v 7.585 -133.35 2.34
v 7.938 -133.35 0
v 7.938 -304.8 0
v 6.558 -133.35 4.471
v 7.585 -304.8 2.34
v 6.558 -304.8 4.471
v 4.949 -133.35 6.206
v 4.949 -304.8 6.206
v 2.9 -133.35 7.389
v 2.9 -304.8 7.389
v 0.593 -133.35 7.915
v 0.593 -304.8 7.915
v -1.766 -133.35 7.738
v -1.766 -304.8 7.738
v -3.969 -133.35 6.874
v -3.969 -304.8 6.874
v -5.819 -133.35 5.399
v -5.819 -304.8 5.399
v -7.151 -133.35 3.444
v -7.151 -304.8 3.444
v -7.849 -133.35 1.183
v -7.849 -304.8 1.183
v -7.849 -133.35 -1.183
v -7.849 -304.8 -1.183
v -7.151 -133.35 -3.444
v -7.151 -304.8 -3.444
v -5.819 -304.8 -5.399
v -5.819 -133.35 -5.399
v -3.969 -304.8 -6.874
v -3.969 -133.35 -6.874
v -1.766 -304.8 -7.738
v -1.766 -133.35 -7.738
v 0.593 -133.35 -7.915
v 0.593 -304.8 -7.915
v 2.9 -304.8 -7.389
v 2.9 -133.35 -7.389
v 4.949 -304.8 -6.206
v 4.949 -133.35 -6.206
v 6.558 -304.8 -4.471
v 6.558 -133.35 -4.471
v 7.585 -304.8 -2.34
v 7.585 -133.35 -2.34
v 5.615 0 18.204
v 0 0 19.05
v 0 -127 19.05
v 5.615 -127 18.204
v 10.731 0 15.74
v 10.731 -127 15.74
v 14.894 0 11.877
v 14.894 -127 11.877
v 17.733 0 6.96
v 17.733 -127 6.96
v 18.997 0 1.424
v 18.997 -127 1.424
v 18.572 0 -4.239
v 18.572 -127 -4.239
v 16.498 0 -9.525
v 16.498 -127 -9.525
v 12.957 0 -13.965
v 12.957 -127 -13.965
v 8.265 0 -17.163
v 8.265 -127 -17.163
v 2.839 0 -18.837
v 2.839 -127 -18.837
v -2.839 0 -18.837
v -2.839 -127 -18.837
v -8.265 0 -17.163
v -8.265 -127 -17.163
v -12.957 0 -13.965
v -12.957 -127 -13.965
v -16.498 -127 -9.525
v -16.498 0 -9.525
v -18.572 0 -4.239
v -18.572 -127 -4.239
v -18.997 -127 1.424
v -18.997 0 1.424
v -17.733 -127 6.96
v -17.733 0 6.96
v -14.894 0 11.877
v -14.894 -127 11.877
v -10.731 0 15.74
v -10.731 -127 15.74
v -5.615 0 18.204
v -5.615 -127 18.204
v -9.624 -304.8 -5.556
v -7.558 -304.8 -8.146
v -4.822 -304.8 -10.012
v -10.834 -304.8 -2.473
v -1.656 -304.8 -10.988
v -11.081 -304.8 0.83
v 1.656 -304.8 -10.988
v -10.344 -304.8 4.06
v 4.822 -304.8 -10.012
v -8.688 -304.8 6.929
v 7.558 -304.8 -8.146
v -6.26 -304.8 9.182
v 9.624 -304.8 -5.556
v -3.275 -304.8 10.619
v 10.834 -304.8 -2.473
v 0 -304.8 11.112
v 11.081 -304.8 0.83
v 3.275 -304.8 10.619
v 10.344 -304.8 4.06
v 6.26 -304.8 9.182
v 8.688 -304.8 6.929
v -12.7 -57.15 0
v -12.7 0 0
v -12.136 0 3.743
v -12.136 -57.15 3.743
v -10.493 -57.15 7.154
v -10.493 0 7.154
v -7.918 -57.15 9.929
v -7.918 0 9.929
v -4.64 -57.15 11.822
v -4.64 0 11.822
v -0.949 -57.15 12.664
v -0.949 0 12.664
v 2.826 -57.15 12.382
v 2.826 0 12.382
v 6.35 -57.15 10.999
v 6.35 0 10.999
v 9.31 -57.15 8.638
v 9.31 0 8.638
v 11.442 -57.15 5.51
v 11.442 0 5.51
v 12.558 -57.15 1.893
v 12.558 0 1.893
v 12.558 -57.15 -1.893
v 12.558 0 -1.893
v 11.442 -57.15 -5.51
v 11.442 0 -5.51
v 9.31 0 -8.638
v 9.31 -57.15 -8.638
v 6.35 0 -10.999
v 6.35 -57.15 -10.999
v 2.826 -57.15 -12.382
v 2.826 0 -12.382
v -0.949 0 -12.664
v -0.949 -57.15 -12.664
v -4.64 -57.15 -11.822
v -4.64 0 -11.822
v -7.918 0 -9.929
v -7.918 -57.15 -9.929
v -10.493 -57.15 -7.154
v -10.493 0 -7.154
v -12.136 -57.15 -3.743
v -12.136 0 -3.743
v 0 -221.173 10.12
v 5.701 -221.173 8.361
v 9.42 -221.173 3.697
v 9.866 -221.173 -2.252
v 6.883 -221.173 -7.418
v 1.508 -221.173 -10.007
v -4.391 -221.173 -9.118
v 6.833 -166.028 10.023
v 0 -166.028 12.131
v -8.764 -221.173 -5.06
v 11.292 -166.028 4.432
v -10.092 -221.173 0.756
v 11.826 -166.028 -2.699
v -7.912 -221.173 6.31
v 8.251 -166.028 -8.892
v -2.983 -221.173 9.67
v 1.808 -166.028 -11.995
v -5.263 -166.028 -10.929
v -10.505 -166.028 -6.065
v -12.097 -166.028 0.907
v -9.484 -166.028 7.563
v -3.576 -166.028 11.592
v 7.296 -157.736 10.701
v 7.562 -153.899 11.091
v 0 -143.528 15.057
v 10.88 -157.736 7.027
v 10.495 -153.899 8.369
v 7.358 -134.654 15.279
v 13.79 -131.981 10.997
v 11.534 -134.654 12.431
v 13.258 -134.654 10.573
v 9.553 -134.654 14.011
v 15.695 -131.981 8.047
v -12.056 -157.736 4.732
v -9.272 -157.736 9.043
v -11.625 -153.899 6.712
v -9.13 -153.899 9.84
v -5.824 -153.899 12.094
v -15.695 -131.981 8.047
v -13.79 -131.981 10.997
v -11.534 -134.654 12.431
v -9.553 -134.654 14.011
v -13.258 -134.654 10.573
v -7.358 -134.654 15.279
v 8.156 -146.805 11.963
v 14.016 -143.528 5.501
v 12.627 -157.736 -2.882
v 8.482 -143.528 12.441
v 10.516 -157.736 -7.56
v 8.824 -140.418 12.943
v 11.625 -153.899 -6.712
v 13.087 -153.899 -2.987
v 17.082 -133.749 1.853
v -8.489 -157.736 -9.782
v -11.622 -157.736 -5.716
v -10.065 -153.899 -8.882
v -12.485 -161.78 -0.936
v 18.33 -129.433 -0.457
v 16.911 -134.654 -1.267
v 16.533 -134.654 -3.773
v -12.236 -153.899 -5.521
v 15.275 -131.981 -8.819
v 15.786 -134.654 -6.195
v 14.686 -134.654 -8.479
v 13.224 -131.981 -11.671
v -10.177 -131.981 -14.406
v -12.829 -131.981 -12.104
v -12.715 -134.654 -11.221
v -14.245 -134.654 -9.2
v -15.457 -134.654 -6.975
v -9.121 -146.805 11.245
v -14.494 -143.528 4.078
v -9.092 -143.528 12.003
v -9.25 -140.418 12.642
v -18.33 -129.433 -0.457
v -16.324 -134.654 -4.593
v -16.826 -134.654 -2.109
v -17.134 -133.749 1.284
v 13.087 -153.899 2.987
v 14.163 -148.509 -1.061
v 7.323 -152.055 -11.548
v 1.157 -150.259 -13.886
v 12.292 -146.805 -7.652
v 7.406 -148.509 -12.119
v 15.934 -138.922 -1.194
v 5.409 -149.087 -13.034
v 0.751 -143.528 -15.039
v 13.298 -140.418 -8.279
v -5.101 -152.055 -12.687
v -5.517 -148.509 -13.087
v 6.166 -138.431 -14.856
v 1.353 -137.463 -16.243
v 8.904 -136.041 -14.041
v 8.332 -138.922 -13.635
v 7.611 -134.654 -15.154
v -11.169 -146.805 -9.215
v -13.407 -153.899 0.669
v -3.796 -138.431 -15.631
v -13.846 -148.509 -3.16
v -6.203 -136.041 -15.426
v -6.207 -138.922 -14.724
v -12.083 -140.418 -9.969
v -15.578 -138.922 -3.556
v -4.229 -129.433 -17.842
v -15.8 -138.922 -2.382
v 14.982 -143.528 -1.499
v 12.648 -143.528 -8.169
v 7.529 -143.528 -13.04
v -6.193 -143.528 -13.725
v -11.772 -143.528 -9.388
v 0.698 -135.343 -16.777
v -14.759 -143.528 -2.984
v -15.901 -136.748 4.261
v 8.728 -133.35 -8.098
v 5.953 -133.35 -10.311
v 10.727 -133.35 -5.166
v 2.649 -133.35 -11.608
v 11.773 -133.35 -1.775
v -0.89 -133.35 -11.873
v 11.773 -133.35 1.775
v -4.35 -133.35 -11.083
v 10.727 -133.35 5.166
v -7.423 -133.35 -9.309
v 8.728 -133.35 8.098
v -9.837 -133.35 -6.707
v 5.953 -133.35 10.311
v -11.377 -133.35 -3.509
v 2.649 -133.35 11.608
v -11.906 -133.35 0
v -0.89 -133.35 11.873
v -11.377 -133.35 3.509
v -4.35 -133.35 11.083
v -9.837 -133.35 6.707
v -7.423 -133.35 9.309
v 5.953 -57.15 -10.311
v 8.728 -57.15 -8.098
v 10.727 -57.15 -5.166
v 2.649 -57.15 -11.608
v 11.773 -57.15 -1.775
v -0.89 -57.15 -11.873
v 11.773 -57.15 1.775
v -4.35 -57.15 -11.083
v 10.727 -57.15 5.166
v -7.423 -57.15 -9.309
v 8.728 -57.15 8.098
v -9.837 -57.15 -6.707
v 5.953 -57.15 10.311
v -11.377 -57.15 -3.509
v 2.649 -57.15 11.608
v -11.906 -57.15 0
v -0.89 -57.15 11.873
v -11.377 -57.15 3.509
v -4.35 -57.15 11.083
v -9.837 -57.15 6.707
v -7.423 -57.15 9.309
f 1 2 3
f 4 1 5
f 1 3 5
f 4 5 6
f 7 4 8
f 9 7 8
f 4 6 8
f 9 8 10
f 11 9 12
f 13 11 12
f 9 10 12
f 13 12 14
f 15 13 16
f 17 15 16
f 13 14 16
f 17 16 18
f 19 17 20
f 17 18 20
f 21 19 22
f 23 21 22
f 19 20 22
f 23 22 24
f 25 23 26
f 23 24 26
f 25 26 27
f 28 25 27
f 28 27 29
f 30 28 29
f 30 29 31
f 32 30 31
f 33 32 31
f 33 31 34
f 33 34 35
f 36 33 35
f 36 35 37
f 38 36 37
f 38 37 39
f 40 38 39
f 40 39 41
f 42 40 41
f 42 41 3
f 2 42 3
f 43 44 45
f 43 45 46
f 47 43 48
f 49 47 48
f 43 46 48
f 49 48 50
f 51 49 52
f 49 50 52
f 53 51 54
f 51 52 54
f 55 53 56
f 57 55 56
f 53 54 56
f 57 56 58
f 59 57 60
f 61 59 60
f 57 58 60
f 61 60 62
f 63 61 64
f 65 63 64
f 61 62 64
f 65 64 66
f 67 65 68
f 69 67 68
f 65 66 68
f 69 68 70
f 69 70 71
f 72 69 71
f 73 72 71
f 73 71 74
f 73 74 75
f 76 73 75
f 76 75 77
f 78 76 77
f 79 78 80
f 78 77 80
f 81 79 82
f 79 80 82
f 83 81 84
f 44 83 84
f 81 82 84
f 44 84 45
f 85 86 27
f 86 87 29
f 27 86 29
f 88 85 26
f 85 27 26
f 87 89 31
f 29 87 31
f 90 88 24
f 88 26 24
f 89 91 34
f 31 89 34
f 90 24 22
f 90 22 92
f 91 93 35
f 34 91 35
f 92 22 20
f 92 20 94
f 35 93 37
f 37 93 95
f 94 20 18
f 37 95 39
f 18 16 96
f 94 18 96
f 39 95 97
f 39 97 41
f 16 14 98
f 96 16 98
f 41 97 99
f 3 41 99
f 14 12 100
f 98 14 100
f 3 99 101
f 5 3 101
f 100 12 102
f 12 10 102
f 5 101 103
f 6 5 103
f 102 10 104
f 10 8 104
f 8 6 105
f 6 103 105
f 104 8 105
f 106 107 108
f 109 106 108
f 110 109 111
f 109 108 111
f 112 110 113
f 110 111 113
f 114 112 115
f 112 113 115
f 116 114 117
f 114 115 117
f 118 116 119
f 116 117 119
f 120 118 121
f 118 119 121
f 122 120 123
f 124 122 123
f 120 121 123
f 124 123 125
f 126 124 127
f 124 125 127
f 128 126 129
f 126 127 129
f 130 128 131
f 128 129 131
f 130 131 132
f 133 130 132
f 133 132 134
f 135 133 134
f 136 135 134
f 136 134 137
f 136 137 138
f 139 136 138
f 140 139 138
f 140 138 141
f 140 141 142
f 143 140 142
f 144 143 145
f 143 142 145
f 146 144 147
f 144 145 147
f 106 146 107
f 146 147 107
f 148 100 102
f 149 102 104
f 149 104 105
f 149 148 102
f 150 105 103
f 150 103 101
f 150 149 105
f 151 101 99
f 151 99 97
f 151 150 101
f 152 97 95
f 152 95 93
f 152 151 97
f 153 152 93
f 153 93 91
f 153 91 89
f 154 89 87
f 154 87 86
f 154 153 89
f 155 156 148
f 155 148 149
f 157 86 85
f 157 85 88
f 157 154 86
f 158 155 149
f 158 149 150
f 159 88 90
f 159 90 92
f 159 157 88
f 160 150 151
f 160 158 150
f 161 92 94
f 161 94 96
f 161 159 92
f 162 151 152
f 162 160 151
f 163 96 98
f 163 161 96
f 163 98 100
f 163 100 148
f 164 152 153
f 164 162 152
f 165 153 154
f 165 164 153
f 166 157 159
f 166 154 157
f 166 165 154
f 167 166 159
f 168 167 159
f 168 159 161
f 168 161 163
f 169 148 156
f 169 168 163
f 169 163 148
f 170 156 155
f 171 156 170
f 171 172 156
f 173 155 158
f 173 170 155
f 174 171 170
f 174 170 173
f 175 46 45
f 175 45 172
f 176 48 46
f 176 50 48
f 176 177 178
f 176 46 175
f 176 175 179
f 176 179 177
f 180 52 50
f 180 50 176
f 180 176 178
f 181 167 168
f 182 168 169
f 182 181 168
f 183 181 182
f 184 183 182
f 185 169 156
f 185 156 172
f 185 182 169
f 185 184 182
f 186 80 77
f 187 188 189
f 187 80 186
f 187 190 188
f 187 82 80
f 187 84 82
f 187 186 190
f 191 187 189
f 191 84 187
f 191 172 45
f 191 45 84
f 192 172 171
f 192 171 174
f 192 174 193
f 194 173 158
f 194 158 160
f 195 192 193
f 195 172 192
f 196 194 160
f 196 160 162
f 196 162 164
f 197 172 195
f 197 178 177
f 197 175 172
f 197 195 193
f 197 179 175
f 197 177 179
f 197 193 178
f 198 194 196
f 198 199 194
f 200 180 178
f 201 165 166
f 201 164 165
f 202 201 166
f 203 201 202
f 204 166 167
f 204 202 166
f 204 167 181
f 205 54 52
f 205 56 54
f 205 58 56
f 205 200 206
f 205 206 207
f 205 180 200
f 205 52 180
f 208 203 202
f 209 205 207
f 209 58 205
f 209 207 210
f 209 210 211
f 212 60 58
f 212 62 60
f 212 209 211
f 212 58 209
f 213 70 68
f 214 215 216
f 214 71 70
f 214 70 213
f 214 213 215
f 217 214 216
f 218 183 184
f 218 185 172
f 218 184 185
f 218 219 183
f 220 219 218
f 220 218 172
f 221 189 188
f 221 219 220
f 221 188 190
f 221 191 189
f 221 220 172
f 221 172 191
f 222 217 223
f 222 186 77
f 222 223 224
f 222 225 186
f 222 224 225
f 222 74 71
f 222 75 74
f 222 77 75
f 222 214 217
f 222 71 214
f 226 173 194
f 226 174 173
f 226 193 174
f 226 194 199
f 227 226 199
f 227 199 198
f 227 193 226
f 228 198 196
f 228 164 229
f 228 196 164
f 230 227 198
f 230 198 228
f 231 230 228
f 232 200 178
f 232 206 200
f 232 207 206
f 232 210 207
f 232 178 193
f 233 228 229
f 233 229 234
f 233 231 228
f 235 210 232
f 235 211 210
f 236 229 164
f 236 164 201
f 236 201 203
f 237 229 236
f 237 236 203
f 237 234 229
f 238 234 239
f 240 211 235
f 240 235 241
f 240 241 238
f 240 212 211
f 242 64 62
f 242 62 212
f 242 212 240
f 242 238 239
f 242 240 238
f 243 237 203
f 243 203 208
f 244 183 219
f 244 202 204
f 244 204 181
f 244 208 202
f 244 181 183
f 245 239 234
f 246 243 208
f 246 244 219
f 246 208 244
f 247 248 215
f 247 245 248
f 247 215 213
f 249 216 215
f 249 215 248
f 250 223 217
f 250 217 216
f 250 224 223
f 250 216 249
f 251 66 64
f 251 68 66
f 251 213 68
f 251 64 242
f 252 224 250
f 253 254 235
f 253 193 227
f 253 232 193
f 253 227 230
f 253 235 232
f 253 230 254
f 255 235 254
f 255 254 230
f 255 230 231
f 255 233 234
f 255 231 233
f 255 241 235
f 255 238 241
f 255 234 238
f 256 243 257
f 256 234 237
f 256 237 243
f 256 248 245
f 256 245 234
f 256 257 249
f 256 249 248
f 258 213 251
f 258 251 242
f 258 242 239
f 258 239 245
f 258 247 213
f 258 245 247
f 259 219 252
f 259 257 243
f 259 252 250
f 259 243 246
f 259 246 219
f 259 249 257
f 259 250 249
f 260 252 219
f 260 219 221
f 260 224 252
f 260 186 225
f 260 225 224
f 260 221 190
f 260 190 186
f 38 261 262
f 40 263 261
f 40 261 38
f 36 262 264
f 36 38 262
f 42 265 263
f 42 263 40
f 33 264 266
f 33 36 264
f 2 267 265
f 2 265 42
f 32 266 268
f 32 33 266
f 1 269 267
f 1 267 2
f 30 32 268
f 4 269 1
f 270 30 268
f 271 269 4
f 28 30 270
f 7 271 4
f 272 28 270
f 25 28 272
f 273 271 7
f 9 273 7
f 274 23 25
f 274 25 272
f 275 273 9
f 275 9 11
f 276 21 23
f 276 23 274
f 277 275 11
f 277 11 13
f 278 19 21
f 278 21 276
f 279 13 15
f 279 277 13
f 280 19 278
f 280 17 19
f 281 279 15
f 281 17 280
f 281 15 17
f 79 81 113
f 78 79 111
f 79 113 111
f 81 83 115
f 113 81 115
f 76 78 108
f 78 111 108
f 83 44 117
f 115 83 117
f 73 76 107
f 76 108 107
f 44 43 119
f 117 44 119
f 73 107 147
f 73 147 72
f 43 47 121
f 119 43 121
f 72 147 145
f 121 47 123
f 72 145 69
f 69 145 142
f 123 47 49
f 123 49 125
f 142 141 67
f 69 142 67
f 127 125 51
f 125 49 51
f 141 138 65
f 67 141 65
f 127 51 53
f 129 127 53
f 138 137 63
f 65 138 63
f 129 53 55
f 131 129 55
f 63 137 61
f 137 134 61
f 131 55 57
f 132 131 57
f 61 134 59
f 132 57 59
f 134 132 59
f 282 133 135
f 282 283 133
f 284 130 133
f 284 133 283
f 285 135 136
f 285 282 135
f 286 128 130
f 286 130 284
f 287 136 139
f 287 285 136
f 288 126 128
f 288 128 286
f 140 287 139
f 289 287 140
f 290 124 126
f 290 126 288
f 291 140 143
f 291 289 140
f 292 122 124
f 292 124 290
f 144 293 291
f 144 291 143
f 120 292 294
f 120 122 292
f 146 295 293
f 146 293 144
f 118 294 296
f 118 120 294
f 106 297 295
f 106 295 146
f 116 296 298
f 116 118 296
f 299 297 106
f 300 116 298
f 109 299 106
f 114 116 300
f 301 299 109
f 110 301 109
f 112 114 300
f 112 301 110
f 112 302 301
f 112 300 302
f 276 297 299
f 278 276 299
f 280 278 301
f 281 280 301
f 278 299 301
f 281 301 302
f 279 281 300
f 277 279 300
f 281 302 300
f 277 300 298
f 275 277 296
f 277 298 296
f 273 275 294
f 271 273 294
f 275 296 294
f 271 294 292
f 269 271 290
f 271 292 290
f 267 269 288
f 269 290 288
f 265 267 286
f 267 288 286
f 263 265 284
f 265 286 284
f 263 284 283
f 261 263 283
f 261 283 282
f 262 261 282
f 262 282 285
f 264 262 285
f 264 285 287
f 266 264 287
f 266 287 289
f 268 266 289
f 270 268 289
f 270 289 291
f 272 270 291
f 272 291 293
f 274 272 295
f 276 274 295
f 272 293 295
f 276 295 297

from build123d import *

# Parameters (mm, degrees)
F2_R     = 7.9375
F3_DEPTH = 304.801
F4_R     = 12.7
F5_DEPTH = 57.15
F6_R     = 11.90625
F7_DEPTH = 76.2


with BuildPart() as f1:
    # F0 (on Right) → F1 (revolve)
    with BuildSketch(Plane.YZ):
        with BuildLine():
            add(Edge.make_bspline(
                [(-304.8, 11.1125), (-285.75, 11.1125), (-242.2367029758, 9.5359179721), (-161.7897503824, 10.6315785702), (-135.382, 16.51), (-127, 19.05)],
                knots=[0, 0, 0, 0, 0.3497446097, 0.7455097749, 1, 1, 1, 1], degree=3))
            Line((-304.8, 11.1125), (-304.8, 0))
            Line((-304.8, 0), (0, 0))
            Line((0, 0), (0, 19.05))
            Line((0, 19.05), (-127, 19.05))
        make_face()
    revolve(axis=Axis((0, -152.4, 0), (0, 1, 0)))

    # F2 (on face) → F3 (cut, through all)
    with BuildSketch(Plane.XZ.offset(304.8)):
        Circle(F2_R)
    extrude(amount=-F3_DEPTH, mode=Mode.SUBTRACT)

    # F4 (on face) → F5 (cut)
    with BuildSketch(Plane(origin=(0, 0, 0), x_dir=(-1, 0, 0), z_dir=(0, 1, 0))):
        Circle(F4_R)
    extrude(amount=-F5_DEPTH, mode=Mode.SUBTRACT)

    # F6 (on face) → F7 (cut)
    with BuildSketch(Plane(origin=(0, -57.15, 0), x_dir=(-1, 0, 0), z_dir=(0, 1, 0))):
        Circle(F6_R)
    extrude(amount=-F7_DEPTH, mode=Mode.SUBTRACT)


solid = f1.part
